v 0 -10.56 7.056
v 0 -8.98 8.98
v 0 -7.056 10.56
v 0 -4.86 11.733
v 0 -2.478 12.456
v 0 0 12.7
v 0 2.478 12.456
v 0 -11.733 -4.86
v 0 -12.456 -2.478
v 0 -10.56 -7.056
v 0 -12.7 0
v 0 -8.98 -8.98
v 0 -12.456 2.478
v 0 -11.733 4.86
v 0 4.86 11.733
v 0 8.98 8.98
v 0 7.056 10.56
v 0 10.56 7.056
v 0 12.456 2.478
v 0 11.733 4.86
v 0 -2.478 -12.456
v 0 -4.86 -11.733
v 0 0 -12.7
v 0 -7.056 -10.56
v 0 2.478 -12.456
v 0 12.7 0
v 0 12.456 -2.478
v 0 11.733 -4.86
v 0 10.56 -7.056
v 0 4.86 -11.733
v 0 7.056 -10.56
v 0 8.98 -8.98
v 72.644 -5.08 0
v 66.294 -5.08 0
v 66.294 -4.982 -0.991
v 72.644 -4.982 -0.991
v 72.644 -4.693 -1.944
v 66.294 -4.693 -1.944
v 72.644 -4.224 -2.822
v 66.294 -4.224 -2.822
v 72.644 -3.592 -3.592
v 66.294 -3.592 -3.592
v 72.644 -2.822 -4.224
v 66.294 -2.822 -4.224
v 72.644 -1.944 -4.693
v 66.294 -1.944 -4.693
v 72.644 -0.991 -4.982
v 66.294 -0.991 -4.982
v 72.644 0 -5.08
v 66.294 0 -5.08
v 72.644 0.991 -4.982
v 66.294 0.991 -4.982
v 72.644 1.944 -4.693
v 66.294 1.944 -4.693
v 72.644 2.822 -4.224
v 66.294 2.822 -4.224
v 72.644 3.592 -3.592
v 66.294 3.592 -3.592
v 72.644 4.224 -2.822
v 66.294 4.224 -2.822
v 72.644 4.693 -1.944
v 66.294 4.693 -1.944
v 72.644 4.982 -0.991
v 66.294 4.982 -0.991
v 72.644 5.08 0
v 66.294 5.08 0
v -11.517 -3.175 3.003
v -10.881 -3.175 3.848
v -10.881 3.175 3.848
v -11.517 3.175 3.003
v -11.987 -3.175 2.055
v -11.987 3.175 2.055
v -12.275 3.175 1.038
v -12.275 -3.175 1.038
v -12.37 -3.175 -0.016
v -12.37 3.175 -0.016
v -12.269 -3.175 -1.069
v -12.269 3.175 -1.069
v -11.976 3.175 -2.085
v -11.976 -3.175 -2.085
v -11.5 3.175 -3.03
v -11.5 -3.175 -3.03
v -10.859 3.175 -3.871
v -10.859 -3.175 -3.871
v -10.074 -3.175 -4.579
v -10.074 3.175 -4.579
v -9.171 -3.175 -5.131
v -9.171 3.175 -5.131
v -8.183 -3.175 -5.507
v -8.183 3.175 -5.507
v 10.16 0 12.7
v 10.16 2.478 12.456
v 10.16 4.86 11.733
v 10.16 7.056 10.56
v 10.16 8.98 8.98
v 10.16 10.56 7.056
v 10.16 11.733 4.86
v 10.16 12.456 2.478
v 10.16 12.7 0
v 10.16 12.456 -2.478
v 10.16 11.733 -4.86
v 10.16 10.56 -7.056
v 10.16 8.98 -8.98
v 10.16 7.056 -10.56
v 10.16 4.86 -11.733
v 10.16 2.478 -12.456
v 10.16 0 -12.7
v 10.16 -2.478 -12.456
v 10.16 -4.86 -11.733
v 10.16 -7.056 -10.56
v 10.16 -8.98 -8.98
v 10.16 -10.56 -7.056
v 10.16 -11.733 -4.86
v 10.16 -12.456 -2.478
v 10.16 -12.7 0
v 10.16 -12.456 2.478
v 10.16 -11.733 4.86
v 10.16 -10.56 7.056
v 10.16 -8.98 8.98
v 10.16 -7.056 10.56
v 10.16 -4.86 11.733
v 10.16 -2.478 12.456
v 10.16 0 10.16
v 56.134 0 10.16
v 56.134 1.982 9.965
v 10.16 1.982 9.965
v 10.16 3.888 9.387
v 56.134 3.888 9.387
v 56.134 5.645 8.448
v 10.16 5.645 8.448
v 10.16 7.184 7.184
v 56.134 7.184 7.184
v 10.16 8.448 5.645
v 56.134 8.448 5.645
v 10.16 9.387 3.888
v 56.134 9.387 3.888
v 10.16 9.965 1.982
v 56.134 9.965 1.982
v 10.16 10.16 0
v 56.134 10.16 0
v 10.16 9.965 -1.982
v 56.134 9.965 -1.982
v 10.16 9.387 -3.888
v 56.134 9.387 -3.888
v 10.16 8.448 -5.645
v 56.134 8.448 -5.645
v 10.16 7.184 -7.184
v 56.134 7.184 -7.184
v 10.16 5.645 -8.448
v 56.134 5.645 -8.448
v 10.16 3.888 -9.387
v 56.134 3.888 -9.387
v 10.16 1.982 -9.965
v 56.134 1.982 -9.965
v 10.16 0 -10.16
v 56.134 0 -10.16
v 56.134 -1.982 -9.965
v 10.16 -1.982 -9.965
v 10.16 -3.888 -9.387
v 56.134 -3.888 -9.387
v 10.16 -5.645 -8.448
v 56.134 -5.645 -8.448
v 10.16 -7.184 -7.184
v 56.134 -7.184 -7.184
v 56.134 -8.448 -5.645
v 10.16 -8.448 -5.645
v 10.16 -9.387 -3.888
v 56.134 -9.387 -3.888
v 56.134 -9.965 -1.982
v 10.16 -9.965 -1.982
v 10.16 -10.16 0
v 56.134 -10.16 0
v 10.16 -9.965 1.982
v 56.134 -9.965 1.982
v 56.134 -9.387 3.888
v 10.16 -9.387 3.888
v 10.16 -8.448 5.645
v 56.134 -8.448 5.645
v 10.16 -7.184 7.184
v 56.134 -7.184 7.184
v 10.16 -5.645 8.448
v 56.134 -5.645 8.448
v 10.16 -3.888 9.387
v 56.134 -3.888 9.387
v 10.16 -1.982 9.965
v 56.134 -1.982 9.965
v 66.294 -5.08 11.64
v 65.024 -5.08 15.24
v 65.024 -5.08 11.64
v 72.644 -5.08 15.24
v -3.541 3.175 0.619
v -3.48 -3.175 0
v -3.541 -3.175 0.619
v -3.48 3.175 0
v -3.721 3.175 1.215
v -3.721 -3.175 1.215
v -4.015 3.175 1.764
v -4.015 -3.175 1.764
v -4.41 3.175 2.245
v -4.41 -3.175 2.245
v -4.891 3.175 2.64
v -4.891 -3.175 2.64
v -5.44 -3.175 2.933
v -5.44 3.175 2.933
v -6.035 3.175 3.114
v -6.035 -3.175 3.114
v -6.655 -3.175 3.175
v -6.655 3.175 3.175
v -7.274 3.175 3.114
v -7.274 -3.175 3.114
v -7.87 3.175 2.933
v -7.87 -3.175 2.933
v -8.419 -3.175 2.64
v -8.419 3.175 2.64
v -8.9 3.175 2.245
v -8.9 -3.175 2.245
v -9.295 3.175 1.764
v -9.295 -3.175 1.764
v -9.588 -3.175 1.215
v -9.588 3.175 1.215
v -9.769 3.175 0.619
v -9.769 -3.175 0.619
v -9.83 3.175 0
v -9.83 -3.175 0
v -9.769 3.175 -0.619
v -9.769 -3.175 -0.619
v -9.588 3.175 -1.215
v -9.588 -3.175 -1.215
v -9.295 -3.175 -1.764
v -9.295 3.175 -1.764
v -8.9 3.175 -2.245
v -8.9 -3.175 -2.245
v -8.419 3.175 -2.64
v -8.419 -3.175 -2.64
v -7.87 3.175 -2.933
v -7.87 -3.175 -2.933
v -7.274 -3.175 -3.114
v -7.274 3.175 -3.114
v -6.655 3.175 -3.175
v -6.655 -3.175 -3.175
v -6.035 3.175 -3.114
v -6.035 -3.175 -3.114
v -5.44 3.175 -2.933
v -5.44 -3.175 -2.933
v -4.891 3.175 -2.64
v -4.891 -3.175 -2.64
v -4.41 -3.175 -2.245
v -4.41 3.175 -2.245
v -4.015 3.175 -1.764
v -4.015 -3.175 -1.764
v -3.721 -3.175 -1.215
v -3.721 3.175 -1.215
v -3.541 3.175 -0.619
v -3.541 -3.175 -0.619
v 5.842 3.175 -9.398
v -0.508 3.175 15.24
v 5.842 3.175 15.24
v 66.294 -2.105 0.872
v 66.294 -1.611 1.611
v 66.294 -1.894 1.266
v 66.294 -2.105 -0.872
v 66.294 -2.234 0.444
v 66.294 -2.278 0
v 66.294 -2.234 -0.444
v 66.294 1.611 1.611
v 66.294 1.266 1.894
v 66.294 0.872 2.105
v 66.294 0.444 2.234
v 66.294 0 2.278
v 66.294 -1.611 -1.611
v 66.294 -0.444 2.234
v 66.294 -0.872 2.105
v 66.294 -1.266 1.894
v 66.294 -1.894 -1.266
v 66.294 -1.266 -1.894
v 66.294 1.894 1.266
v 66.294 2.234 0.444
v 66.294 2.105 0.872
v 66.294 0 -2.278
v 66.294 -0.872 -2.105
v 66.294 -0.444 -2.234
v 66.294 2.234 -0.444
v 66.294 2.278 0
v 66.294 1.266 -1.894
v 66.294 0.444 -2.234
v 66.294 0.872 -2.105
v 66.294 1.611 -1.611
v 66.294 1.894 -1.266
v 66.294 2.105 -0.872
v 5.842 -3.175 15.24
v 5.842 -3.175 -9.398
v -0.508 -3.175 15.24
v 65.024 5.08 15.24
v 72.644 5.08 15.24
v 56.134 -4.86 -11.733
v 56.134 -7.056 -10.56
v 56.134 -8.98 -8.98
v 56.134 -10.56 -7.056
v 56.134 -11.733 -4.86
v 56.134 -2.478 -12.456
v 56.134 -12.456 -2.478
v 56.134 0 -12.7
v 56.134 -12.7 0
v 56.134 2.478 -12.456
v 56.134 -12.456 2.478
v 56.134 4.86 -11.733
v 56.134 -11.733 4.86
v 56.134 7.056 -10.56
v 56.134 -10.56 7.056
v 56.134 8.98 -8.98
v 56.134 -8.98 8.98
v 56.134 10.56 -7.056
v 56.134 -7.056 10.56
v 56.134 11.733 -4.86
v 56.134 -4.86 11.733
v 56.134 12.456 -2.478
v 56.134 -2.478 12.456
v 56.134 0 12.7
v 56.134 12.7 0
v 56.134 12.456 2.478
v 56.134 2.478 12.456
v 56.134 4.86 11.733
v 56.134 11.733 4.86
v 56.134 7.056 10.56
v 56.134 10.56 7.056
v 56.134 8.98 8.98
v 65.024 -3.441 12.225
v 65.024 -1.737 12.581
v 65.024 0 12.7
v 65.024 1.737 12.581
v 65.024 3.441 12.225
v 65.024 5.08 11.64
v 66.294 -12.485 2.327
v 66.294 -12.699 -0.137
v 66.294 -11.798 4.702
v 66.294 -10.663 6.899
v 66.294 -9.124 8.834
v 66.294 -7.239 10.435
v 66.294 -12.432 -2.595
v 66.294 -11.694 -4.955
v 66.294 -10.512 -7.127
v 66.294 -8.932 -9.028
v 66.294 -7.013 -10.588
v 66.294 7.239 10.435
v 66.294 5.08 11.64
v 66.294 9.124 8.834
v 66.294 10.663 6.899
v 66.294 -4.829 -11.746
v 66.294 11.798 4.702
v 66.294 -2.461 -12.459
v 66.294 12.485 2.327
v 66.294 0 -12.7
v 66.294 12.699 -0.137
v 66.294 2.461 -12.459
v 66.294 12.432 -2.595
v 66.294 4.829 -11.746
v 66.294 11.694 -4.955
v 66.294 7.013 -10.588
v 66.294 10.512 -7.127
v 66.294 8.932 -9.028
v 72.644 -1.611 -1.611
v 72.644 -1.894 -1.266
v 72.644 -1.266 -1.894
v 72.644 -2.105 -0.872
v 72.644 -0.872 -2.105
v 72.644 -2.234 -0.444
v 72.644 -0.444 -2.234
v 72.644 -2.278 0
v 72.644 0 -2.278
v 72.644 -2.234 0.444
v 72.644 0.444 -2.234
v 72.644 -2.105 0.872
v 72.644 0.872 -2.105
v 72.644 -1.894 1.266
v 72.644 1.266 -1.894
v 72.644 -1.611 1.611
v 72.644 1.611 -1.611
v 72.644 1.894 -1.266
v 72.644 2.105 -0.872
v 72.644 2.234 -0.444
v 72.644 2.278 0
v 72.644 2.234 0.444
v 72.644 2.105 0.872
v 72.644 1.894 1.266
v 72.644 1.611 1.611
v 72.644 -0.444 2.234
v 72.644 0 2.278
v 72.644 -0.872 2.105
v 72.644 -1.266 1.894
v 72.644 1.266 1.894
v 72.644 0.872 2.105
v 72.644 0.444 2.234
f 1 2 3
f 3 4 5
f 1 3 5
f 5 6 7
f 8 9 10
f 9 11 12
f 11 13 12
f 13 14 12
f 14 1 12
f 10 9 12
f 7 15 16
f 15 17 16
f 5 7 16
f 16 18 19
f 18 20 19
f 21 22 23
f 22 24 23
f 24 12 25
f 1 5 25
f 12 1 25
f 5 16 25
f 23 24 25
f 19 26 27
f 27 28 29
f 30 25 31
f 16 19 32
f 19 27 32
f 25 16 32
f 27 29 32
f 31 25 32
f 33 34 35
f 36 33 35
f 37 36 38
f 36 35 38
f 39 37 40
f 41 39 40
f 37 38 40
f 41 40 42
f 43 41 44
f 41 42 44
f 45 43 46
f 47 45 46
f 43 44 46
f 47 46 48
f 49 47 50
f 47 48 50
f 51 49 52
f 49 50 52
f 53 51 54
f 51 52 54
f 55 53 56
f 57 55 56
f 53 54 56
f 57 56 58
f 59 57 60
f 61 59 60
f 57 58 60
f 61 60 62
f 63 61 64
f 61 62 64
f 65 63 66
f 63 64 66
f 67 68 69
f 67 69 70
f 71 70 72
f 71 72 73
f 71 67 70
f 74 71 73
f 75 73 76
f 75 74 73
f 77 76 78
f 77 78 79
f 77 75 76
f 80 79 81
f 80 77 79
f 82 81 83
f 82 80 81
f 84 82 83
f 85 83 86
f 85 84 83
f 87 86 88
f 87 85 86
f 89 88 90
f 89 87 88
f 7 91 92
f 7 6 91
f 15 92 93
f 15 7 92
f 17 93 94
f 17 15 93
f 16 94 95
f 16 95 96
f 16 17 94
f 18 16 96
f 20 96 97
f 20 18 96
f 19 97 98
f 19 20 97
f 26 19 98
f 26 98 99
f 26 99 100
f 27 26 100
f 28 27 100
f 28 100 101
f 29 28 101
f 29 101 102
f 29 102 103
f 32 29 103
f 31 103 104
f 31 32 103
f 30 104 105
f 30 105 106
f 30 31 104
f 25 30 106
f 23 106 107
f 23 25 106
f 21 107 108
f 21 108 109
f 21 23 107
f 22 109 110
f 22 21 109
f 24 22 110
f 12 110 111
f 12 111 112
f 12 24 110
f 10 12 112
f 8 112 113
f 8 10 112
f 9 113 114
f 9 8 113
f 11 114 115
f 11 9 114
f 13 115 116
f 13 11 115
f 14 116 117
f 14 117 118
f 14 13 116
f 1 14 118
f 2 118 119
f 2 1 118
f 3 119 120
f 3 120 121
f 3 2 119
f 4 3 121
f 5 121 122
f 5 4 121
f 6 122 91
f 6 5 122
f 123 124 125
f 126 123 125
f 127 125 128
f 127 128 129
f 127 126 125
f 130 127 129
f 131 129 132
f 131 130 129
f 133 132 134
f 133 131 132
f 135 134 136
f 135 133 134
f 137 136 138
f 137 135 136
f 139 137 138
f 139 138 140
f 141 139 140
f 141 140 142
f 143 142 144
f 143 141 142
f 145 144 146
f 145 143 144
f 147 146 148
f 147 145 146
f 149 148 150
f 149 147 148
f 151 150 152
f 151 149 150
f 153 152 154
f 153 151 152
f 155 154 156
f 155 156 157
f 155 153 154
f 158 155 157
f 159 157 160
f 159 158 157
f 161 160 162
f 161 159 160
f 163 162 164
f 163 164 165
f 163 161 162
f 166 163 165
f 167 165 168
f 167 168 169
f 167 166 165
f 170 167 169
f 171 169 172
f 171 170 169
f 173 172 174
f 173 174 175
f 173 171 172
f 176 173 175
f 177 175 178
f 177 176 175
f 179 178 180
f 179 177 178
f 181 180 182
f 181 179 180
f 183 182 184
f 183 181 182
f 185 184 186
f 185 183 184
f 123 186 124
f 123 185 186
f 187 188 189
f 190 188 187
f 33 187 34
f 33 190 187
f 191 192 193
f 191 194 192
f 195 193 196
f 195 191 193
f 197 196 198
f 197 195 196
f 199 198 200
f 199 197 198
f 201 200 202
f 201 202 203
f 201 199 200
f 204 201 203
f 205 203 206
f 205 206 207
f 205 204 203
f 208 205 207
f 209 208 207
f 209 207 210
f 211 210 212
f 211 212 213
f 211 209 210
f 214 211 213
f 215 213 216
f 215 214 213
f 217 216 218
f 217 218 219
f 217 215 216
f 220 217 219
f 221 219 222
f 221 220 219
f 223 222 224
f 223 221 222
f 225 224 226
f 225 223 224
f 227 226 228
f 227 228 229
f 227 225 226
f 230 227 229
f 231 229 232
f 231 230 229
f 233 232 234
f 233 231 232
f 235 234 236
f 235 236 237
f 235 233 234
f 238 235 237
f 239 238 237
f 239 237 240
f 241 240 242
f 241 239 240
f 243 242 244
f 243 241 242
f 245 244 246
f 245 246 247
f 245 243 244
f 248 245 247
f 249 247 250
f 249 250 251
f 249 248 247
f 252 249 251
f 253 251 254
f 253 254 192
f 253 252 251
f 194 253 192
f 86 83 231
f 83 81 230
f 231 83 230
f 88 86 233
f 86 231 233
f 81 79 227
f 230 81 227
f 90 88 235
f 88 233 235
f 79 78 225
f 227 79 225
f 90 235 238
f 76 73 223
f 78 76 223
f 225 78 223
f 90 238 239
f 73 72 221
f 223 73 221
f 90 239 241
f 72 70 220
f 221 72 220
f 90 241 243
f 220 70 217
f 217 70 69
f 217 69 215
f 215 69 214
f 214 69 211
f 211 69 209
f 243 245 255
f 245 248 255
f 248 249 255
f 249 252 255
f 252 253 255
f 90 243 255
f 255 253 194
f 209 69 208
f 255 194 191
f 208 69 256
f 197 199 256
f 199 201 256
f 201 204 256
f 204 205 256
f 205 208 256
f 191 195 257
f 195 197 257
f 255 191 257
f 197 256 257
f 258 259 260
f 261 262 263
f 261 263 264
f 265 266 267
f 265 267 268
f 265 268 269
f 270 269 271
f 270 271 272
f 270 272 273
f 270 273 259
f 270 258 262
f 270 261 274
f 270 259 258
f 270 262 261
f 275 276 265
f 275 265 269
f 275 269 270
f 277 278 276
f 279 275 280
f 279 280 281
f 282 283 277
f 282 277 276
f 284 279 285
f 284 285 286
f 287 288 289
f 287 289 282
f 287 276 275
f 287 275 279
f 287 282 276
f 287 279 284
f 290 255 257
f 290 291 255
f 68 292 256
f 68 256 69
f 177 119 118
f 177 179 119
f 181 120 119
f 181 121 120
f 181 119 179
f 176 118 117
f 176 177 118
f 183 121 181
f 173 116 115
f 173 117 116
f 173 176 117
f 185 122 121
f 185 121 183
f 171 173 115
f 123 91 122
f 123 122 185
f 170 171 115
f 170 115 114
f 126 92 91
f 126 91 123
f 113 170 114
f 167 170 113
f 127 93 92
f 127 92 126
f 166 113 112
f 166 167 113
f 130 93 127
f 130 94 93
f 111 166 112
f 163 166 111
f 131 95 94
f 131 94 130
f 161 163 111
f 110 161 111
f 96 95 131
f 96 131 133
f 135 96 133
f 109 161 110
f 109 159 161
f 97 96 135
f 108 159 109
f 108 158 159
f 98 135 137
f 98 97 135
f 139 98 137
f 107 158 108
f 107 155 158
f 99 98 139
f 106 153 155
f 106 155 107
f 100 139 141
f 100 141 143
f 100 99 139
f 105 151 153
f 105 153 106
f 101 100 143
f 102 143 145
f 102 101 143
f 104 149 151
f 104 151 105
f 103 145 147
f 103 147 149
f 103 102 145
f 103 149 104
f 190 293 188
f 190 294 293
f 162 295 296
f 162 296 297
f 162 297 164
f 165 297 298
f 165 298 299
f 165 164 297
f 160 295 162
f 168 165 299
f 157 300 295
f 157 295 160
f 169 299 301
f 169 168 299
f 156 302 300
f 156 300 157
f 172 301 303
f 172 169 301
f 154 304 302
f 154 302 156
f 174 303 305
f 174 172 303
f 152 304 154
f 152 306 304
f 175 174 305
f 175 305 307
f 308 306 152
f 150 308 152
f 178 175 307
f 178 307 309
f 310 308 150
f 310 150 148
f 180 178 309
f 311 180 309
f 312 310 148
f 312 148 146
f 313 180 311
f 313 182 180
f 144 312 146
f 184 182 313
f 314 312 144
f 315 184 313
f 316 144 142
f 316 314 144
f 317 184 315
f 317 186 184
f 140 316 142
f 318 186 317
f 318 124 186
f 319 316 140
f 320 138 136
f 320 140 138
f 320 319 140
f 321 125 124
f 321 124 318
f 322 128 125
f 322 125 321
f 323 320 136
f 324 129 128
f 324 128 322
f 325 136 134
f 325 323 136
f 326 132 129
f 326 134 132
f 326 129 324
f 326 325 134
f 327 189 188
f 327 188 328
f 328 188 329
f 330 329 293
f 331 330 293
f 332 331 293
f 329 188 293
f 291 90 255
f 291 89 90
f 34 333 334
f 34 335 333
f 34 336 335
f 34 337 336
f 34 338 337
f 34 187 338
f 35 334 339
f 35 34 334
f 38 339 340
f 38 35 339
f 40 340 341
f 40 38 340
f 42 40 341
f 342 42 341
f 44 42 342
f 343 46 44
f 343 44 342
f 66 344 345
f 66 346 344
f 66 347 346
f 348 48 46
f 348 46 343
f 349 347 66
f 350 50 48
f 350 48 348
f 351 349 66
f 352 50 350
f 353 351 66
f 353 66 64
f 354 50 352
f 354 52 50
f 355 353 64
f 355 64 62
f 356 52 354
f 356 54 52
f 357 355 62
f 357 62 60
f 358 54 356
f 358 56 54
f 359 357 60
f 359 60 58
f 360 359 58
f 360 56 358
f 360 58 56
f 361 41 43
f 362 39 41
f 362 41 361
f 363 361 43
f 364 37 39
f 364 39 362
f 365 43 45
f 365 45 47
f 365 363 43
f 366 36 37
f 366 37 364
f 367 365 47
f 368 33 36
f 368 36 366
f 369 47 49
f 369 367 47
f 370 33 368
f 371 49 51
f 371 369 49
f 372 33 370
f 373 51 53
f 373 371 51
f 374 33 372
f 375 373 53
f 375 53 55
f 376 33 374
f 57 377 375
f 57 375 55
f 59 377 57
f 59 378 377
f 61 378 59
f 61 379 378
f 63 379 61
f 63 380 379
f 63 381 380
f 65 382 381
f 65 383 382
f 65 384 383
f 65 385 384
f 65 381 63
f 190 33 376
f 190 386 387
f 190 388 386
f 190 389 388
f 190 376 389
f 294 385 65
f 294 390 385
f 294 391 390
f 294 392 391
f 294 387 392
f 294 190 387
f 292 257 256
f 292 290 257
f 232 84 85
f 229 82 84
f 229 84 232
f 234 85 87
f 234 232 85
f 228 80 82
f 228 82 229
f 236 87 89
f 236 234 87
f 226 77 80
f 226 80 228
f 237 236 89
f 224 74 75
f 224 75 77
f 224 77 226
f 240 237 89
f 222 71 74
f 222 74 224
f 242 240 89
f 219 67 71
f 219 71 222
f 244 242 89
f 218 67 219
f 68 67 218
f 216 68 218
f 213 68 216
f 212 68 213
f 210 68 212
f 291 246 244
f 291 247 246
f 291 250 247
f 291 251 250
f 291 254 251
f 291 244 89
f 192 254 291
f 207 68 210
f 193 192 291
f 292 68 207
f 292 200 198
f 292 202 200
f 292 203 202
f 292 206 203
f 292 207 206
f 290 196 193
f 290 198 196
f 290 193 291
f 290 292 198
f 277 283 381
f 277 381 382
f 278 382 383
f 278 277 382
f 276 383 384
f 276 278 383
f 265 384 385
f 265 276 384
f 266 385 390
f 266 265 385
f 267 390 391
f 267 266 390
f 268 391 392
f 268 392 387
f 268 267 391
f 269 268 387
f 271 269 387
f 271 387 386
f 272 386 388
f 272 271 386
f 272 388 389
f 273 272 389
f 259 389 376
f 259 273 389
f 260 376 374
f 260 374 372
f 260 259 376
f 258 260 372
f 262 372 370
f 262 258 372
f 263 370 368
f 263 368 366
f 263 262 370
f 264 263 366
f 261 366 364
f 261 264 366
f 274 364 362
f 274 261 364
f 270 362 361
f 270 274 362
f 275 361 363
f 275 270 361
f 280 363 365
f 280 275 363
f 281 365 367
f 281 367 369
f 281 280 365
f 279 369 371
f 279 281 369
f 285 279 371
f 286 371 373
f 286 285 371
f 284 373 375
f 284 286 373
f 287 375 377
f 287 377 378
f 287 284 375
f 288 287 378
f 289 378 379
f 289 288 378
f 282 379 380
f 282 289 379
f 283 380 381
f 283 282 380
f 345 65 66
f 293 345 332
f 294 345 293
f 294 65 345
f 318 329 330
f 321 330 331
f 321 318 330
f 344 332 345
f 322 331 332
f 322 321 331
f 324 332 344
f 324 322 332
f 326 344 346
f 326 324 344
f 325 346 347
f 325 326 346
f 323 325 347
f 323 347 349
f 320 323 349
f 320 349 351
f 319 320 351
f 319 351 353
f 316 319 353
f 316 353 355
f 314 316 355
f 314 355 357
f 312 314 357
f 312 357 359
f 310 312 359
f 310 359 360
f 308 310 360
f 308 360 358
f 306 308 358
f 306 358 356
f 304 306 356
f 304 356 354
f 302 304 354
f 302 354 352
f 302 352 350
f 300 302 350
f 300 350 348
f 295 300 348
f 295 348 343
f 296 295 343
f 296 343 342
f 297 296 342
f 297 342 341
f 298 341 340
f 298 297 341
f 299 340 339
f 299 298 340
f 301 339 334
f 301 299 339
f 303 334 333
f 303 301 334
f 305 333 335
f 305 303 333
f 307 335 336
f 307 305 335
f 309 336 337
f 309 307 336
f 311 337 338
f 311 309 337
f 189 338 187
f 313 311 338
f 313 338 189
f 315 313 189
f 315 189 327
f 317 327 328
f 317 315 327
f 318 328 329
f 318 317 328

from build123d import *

# Parameters (mm, degrees)
F0_W          = 5.842
F0_H          = 12.7
F0_R          = 3.175
F2_DEPTH      = 3.175
F3_R          = 2.277942
F4_DEPTH      = 6.35
F4_DEPTH_BACK = 1.27


with BuildPart() as f1:
    # F0 (on Front) → F1 (revolve)
    with BuildSketch(Plane.XZ):
        Polygon((5.842, 12.7), (5.842, 0), (66.294, 0), (66.294, 12.7), (56.134, 12.7), (56.134, 10.16), (10.16, 10.16), (10.16, 12.7), align=None)
        with Locations((2.921, 6.35)):
            Rectangle(F0_W, F0_H)
    revolve(axis=Axis((33.147, 0, 0), (-1, 0, 0)))

    # F3 (on face) → F4 (join, two sides)
    with BuildSketch(Plane.YZ.offset(66.294)) as f4_sk:
        with BuildLine():
            ThreePointArc((-5.08, 0), (0, -5.08), (5.08, 0))
            ThreePointArc((5.08, 0), (0, 5.08), (-5.08, 0))
        make_face()
        Circle(F3_R, mode=Mode.SUBTRACT)
        with BuildLine():
            ThreePointArc((-5.08, 0), (0, 5.08), (5.08, 0))
            Line((5.08, 0), (5.08, 15.24))
            Line((5.08, 15.24), (-5.08, 15.24))
            Line((-5.08, 15.24), (-5.08, 0))
        make_face()
    extrude(amount=F4_DEPTH)
    extrude(f4_sk.sketch, amount=-F4_DEPTH_BACK)


with BuildPart() as f2:
    # F0 (on Front) → F2 (new body, symmetric)
    with BuildSketch(Plane.XZ):
        with BuildLine():
            Line((-0.9398, 0), (0, 0))
            Line((0, 0), (0, 12.7))
            Line((0, 12.7), (5.842, 12.7))
            Line((5.842, 12.7), (5.842, 15.24))
            Line((5.842, 15.24), (-0.508, 15.24))
            Line((-0.508, 15.24), (-10.88063, 3.847543))
            ThreePointArc((-10.88063, 3.847543), (-4.591961, 5.329721), (-0.9398, 0))
        make_face()
        with Locations((2.921, 6.35)):
            Rectangle(F0_W, F0_H)
        with BuildLine():
            Line((5.842, 0), (0, 0))
            Line((0, 0), (-0.9398, 0))
            ThreePointArc((-0.9398, 0), (-3.195791, -4.549339), (-8.182663, -5.506983))
            Line((-8.182663, -5.506983), (5.842, -9.398))
            Line((5.842, -9.398), (5.842, 0))
        make_face()
        with BuildLine():
            ThreePointArc((-8.182663, -5.506983), (-3.195791, -4.549339), (-0.9398, 0))
            ThreePointArc((-0.9398, 0), (-4.591961, 5.329721), (-10.88063, 3.847543))
            ThreePointArc((-10.88063, 3.847543), (-12.145978, -1.583727), (-8.182663, -5.506983))
        make_face()
        with Locations((-6.6548, 0)):
            Circle(F0_R, mode=Mode.SUBTRACT)
    extrude(amount=F2_DEPTH, both=True)


solid = Compound([f1.part, f2.part])
